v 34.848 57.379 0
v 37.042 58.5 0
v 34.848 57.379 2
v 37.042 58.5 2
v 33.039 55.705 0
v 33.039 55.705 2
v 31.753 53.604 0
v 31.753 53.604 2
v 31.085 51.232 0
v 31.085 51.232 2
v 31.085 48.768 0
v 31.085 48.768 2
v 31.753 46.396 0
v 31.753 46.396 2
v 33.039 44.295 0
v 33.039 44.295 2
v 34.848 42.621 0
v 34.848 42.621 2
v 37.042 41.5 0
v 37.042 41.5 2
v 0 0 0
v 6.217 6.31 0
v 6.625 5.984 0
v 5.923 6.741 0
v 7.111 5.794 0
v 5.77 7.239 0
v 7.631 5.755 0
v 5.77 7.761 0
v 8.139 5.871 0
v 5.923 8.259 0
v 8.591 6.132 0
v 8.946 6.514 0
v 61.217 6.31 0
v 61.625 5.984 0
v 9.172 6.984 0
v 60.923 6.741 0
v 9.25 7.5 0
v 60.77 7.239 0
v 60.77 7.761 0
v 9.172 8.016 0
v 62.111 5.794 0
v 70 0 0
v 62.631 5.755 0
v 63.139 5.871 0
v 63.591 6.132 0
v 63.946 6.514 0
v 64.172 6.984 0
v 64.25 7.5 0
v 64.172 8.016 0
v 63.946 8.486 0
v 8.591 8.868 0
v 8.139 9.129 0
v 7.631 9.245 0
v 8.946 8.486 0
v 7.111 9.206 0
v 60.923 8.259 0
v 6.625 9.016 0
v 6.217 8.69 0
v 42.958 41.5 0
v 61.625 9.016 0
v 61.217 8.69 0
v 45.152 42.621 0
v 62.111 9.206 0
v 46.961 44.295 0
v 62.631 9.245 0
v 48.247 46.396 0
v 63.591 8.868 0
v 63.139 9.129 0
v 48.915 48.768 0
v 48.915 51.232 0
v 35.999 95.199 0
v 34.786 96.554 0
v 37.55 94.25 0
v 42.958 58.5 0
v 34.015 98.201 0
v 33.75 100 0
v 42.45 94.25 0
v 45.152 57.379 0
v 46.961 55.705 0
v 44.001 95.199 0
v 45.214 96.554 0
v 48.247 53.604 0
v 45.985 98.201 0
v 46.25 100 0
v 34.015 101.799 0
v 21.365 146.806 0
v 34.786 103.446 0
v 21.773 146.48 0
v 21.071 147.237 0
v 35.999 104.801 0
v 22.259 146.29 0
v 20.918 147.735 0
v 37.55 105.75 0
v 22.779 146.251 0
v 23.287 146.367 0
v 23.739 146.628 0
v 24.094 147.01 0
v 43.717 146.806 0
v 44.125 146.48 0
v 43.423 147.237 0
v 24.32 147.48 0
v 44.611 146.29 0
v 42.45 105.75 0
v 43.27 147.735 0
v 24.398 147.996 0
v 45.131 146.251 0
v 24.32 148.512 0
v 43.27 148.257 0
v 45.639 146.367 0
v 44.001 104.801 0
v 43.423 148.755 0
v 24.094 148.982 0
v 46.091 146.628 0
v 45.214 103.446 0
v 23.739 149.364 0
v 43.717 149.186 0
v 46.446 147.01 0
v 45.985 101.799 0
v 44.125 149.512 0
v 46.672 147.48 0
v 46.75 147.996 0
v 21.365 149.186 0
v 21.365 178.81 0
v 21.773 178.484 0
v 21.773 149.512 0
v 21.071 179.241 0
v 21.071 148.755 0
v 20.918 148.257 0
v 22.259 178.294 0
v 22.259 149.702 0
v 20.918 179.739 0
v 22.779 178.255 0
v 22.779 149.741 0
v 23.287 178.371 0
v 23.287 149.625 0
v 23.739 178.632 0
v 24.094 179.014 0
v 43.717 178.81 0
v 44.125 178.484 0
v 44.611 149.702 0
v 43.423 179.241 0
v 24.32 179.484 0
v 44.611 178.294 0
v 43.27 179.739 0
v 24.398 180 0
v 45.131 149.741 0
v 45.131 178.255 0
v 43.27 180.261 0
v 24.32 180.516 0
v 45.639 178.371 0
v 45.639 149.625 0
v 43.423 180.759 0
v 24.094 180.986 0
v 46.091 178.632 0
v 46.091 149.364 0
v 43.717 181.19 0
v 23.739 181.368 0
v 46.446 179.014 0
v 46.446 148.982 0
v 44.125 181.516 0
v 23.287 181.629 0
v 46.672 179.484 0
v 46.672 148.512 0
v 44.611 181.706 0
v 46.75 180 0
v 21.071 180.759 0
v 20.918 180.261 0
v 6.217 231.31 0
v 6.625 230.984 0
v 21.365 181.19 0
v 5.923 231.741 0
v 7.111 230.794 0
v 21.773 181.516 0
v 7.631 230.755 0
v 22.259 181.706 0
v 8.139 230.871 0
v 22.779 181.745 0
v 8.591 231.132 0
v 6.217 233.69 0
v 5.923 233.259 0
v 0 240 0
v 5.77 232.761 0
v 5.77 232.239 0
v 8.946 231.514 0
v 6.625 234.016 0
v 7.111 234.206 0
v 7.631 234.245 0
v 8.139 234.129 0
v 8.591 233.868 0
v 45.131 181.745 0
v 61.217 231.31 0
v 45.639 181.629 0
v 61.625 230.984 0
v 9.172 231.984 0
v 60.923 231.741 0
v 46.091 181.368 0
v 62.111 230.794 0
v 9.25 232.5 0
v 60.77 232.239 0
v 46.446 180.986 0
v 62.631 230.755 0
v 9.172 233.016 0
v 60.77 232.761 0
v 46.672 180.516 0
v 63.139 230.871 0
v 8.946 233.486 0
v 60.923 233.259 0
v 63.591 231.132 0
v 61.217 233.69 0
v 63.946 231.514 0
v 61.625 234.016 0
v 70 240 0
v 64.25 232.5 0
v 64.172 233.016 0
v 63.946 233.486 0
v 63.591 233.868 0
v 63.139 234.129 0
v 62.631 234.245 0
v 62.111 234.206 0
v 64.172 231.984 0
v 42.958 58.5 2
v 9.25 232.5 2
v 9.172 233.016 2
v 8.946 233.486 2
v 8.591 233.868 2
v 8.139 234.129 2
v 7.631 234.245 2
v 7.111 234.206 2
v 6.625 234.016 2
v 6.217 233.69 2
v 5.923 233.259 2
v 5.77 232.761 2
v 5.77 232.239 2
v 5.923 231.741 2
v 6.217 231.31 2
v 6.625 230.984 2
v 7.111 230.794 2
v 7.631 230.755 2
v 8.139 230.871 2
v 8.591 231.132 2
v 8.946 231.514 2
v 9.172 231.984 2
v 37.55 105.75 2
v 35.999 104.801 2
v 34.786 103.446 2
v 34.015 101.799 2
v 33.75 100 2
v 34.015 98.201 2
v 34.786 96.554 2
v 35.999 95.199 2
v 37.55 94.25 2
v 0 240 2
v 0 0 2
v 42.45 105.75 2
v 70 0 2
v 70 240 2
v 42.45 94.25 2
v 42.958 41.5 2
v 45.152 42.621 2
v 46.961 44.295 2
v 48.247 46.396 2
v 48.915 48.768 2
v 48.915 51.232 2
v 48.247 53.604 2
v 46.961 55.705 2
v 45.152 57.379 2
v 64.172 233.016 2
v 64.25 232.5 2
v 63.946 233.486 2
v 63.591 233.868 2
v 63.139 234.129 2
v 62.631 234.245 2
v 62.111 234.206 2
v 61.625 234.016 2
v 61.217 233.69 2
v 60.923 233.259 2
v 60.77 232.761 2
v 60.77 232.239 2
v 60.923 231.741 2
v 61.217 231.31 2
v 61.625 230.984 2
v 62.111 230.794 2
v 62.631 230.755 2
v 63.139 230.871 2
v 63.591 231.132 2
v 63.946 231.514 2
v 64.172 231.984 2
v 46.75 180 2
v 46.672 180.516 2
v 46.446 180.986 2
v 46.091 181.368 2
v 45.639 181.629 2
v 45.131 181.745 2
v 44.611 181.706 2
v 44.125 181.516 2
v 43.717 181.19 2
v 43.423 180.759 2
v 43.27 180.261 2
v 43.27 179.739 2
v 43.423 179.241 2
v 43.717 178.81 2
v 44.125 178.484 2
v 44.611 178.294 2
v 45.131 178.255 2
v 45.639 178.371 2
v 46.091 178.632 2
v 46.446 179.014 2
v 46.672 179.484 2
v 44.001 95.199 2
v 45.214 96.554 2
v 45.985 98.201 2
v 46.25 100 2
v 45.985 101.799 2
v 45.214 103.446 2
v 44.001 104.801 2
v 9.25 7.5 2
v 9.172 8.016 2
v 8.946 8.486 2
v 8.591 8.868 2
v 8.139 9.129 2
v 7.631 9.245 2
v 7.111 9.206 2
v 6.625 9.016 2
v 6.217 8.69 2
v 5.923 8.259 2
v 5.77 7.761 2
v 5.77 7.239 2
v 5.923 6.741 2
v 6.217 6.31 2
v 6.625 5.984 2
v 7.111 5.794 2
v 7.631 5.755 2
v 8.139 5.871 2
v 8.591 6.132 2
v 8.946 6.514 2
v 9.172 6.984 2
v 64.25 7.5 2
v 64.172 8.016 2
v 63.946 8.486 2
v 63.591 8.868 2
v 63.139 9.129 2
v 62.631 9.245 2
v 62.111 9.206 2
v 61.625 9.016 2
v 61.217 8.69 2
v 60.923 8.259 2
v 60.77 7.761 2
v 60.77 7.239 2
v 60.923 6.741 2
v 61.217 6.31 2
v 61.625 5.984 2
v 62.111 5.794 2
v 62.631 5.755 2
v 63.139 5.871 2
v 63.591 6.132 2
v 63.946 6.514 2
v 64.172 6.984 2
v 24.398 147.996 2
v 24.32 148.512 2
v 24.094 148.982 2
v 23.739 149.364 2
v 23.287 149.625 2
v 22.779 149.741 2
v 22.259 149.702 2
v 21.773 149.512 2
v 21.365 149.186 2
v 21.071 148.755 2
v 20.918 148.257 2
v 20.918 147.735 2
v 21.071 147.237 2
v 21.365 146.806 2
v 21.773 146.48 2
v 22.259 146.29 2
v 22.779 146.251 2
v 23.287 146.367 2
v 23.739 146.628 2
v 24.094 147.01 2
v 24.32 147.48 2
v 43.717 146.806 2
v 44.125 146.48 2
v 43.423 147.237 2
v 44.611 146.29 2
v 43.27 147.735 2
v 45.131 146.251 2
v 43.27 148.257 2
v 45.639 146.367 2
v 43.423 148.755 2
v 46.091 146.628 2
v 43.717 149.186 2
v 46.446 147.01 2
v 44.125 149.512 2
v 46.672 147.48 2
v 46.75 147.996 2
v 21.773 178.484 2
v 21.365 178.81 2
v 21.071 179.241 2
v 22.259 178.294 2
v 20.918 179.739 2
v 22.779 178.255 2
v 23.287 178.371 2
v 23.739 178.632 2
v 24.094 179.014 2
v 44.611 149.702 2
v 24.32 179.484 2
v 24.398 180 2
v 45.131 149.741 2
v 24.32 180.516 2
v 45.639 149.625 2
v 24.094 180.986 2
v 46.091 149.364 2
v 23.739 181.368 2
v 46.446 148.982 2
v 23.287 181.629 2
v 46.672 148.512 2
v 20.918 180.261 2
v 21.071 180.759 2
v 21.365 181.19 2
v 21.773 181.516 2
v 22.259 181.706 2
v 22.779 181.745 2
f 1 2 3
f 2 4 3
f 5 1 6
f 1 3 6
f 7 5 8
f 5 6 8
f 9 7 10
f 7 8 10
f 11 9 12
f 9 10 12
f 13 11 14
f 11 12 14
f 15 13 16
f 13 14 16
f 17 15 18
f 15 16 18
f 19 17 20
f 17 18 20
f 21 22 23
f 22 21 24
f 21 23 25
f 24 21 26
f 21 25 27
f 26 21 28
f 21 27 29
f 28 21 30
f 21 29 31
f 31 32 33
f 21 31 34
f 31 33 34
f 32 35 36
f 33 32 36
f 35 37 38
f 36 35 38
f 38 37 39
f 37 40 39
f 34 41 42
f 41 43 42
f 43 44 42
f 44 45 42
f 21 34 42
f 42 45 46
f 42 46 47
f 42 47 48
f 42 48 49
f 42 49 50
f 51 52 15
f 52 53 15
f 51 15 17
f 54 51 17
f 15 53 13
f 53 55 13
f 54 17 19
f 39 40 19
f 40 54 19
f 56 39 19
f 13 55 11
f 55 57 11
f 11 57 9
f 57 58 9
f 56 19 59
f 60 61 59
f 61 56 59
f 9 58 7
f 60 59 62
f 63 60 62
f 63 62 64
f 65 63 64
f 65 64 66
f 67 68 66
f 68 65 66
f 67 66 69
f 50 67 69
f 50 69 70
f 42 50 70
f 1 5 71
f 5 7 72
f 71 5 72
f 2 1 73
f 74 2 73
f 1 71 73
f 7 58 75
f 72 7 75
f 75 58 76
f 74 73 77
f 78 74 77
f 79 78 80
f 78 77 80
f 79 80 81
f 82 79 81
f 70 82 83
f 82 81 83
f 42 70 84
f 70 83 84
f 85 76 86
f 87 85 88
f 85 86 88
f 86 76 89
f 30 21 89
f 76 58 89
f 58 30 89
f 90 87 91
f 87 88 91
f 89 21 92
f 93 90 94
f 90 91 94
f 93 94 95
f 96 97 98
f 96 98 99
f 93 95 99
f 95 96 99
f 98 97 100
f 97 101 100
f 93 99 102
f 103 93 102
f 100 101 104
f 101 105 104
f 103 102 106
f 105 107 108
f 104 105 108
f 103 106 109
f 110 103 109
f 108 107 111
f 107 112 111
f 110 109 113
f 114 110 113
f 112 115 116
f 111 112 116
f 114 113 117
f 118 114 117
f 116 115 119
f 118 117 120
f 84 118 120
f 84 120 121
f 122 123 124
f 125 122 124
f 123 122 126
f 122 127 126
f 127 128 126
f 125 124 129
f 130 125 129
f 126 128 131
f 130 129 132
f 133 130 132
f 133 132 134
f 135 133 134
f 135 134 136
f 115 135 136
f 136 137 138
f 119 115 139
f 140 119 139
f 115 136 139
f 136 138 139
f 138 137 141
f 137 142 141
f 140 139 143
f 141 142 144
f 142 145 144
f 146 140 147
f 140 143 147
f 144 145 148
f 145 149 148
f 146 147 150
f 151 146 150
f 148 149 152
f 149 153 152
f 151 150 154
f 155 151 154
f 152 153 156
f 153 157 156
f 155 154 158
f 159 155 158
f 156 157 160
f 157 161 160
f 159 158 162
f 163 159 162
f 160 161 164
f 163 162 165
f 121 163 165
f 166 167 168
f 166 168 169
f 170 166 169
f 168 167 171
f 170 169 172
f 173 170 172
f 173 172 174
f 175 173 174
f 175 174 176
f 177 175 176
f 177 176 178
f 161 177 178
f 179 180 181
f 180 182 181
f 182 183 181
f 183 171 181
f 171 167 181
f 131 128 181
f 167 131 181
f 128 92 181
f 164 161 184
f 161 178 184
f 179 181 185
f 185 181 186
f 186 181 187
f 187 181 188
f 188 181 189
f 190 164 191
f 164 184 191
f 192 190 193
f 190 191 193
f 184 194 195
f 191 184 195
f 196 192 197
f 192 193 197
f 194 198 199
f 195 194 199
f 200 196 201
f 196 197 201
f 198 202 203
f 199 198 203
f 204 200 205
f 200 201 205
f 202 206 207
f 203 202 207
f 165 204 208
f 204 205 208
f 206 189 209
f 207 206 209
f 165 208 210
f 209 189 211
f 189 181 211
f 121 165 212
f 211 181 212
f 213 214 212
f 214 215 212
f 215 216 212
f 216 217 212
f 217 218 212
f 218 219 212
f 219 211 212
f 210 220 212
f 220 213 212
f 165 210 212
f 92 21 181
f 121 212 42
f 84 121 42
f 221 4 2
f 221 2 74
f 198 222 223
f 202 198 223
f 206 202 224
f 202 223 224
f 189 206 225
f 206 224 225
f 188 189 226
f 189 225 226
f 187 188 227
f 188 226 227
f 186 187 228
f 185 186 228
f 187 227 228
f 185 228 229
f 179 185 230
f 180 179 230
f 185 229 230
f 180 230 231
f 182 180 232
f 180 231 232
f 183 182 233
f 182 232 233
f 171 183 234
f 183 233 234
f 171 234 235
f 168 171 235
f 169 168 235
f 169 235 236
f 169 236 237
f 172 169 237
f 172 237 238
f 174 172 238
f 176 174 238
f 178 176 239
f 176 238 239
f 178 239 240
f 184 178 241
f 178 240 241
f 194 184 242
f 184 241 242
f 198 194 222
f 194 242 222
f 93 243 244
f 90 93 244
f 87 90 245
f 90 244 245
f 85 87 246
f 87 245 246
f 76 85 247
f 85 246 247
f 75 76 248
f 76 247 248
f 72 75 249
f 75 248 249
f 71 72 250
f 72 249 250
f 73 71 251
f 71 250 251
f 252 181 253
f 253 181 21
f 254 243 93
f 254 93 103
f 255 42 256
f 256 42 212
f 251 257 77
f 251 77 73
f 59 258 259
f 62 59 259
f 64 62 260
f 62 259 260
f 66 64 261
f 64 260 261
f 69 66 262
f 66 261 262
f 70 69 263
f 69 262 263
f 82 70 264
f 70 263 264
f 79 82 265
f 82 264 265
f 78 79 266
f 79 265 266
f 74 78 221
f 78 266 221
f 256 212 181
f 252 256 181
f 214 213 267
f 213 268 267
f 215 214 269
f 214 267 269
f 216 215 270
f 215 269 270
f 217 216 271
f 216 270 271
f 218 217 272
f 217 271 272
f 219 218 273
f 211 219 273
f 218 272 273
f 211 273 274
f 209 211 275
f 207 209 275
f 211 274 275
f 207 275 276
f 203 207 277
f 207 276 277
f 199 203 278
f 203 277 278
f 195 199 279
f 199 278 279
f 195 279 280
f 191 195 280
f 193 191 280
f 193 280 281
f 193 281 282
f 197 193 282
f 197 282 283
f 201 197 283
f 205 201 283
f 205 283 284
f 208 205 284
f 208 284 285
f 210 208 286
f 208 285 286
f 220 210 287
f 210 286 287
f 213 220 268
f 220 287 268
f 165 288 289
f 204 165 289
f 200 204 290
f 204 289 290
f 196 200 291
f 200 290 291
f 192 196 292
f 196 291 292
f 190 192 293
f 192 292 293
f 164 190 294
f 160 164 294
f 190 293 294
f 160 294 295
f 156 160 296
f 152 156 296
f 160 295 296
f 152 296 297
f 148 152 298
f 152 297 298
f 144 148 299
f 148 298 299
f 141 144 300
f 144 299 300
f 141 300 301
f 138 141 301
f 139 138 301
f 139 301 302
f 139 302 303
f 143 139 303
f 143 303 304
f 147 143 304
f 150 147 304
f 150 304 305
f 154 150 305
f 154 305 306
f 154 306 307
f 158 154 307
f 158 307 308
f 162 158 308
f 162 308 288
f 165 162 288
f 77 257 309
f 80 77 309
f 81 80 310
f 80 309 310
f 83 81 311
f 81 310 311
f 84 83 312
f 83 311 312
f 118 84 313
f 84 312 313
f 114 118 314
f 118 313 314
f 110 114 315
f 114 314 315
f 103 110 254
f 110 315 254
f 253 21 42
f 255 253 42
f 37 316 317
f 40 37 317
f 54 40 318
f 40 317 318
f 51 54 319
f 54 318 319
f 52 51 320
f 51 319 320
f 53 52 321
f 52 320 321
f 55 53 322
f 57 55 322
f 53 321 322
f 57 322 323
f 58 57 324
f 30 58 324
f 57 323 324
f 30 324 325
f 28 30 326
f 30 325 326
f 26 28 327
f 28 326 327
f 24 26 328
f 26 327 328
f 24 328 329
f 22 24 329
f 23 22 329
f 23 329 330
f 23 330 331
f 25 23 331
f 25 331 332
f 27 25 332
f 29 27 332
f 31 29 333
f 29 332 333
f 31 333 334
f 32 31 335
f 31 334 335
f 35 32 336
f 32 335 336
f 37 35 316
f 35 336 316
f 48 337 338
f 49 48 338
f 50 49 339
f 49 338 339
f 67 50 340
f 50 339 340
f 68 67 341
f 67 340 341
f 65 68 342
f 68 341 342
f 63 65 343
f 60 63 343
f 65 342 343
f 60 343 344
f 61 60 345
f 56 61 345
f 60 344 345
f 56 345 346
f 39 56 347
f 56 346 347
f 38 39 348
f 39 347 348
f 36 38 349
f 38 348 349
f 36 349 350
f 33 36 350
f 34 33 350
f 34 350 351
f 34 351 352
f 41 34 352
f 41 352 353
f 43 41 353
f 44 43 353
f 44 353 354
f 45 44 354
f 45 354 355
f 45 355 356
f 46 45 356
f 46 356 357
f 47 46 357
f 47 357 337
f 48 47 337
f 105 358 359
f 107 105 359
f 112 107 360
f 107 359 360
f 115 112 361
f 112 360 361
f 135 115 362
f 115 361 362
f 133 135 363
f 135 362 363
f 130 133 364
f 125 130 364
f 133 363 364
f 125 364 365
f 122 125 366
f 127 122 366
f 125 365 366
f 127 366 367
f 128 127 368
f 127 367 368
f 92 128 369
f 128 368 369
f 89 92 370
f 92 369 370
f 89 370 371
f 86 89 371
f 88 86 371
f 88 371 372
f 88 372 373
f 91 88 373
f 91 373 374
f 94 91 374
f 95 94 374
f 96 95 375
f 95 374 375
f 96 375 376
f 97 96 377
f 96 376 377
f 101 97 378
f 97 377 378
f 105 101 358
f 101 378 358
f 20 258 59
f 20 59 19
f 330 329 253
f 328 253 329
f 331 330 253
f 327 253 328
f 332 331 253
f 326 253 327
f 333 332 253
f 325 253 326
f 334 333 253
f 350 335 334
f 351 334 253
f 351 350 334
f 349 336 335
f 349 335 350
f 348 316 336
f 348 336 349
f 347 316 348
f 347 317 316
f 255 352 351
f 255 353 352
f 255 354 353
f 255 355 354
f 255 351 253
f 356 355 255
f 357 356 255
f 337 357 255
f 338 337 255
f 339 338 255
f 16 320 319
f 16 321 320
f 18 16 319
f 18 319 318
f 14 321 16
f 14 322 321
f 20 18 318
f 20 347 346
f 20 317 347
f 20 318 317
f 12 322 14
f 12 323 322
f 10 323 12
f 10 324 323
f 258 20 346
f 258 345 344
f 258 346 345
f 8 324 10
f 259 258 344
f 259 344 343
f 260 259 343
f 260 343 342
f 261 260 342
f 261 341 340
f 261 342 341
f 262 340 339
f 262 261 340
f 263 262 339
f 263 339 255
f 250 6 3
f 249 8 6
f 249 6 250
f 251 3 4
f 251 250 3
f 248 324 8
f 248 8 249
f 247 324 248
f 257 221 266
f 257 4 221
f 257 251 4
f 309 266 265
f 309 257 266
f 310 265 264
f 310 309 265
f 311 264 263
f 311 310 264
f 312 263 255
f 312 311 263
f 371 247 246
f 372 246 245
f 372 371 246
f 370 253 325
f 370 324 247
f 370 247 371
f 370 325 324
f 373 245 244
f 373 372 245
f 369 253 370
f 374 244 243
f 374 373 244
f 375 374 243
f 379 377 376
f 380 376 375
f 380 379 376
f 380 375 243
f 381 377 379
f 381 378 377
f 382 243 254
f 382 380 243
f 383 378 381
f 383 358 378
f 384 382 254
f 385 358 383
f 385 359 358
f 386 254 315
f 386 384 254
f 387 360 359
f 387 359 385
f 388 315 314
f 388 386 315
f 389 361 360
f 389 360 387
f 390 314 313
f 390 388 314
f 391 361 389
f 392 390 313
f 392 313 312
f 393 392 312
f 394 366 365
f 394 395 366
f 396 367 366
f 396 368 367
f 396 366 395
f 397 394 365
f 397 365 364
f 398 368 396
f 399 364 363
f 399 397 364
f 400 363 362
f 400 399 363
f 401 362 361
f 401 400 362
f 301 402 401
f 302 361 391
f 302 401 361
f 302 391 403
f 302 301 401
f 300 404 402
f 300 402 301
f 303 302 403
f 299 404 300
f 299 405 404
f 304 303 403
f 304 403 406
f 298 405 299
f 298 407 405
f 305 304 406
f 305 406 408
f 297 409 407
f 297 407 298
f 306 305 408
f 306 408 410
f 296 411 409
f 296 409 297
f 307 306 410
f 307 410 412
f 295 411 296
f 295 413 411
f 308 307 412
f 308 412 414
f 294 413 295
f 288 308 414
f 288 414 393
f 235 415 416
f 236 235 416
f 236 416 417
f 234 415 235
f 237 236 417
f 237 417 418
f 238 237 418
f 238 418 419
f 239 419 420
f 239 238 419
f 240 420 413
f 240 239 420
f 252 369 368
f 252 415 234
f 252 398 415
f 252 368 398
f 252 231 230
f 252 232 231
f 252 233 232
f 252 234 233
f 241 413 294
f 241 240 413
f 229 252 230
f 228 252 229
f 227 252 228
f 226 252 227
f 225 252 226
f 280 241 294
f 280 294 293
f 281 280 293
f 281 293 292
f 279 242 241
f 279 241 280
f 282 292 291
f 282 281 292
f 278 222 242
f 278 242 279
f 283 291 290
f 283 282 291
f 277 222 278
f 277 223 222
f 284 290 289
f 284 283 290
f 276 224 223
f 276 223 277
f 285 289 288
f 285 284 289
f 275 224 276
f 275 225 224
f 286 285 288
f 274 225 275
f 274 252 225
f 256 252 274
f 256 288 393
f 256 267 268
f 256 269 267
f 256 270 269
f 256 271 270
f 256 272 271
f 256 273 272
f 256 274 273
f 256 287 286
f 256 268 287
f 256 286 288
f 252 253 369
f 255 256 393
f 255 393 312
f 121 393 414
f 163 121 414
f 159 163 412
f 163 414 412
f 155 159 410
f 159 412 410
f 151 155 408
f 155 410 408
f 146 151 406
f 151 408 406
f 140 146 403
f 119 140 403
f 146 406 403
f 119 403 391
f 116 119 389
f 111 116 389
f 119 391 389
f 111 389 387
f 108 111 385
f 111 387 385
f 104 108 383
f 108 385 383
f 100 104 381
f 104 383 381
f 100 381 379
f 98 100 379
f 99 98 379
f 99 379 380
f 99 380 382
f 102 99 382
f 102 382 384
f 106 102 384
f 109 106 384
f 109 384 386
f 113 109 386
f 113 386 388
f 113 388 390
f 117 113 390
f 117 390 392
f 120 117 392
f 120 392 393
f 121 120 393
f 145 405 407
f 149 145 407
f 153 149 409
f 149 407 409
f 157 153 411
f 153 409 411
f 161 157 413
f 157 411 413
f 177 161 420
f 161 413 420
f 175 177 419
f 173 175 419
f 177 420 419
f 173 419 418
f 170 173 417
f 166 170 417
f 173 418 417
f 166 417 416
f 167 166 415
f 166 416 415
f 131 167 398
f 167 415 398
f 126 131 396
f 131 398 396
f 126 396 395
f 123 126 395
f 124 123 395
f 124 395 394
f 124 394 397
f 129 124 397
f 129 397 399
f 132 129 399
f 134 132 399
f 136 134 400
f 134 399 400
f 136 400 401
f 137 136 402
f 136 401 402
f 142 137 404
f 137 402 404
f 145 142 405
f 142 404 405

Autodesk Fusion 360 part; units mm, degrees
sketch "Sketch1" plane through (0, 0, 0) normal (0, 0, 1) x (1, 0, 0)
  line L0 (0, 0) -> (70, 0)
  line L1 (70, 0) -> (70, 240)
  line L2 (70, 240) -> (0, 240)
  line L3 (0, 240) -> (0, 0)
  dimension "d1" = 240
  dimension "d2" = 70
extrude "Extrude1" add sketch "Sketch1" along normal blind 2
sketch "Sketch2" plane through (0, 0, 2) normal (0, 0, 1) x (1, 0, 0)
  line L0 (0, 240) -> (0, 0)
  line L1 (0, 0) -> (70, 0)
  line L2 (70, 0) -> (70, 240)
  line L3 (70, 240) -> (0, 240)
  circle A0 centre (40, 50) radius 9
  line L4 (42.958, 41.5) -> (37.042, 41.5)
  line L5 (37.042, 41.5) -> (37.042, 58.5)
  line L6 (37.042, 58.5) -> (42.958, 58.5)
  line L7 (42.958, 58.5) -> (42.958, 41.5)
  circle A1 centre (40, 100) radius 6.25
  line L8 (42.4495, 94.25) -> (37.5505, 94.25)
  line L9 (37.5505, 94.25) -> (37.5505, 105.75)
  line L10 (37.5505, 105.75) -> (42.4495, 105.75)
  line L11 (42.4495, 105.75) -> (42.4495, 94.25)
  point P0 (35, 0)
  point P1 (40, 41.5)
  dimension "d5" = 18
  dimension "d6" = 17
  dimension "d7" = 50
  dimension "d8" = 12.5
  dimension "d9" = 11.5
  dimension "d10" = 50
  dimension "d14" = 40
extrude "Extrude2" cut sketch "Sketch2" against normal blind 15 contours A0 L7 | L4 L5 L6 L7 | A0 L5 | A1 L11 | L8 L9 L10 L11 | A1 L9
sketch "Sketch3" plane through (0, 0, 2) normal (0, 0, 1) x (1, 0, 0)
  line L0 (42.958, 41.5) -> (37.042, 41.5)
  arc A0 (37.042, 58.5) -> (37.042, 41.5) centre (40, 50) ccw
  line L1 (37.042, 58.5) -> (42.958, 58.5)
  arc A1 (42.958, 41.5) -> (42.958, 58.5) centre (40, 50) ccw
  line L2 (42.4495, 94.25) -> (37.5505, 94.25)
  arc A2 (37.5505, 105.75) -> (37.5505, 94.25) centre (40, 100) ccw
  line L3 (37.5505, 105.75) -> (42.4495, 105.75)
  arc A3 (42.4495, 94.25) -> (42.4495, 105.75) centre (40, 100) ccw
  line L4 (0, 240) -> (0, 0)
  line L5 (0, 0) -> (70, 0)
  line L6 (70, 0) -> (70, 240)
  line L7 (70, 240) -> (0, 240)
  circle A4 centre (7.5, 232.5) radius 1.75
  circle A5 centre (62.5, 232.5) radius 1.75
  circle A6 centre (62.5, 7.5) radius 1.75
  circle A7 centre (7.5, 7.5) radius 1.75
  line L8 (7.5, 232.5) -> (7.5, 7.5) construction
  line L9 (7.5, 7.5) -> (62.5, 7.5) construction
  line L10 (62.5, 7.5) -> (62.5, 232.5) construction
  line L11 (62.5, 232.5) -> (7.5, 232.5) construction
  dimension "d15" = 7.5
  dimension "d16" = 3.5
  dimension "d17" = 3.5
  dimension "d18" = 3.5
  dimension "d19" = 3.5
extrude "Extrude3" cut sketch "Sketch3" against normal blind 5 contours A4 | A5 | A6 | A7
sketch "Sketch4" plane through (0, 0, 2) normal (0, 0, 1) x (1, 0, 0)
  circle A0 centre (62.5, 232.5) radius 1.75
  circle A1 centre (7.5, 7.5) radius 1.75
  circle A2 centre (7.5, 232.5) radius 1.75
  circle A3 centre (62.5, 7.5) radius 1.75
  line L0 (42.958, 41.5) -> (37.042, 41.5)
  arc A4 (37.042, 58.5) -> (37.042, 41.5) centre (40, 50) ccw
  line L1 (37.042, 58.5) -> (42.958, 58.5)
  arc A5 (42.958, 41.5) -> (42.958, 58.5) centre (40, 50) ccw
  line L2 (42.4495, 94.25) -> (37.5505, 94.25)
  arc A6 (37.5505, 105.75) -> (37.5505, 94.25) centre (40, 100) ccw
  line L3 (37.5505, 105.75) -> (42.4495, 105.75)
  arc A7 (42.4495, 94.25) -> (42.4495, 105.75) centre (40, 100) ccw
  line L4 (0, 240) -> (0, 0)
  line L5 (0, 0) -> (70, 0)
  line L6 (70, 0) -> (70, 240)
  line L7 (70, 240) -> (0, 240)
  circle A8 centre (22.648, 147.996) radius 1.75
  circle A9 centre (22.648, 180) radius 1.75
  circle A10 centre (45, 147.996) radius 1.75
  circle A11 centre (45, 180) radius 1.75
  dimension "d22" = 3.5
  dimension "d23" = 3.5
  dimension "d24" = 32.004
  dimension "d25" = 3.5
  dimension "d26" = 3.5
  dimension "d27" = 22.352
  dimension "d28" = 25
  dimension "d29" = 60
extrude "Extrude4" cut sketch "Sketch4" against normal blind 5 contours A8 | A9 | A10 | A11
equation "d1 = 210 mm + 30 mm"
equation "d17 = d16"
equation "d18 = d16"
equation "d19 = d16"
equation "d23 = d22"
equation "d25 = d22"
equation "d26 = d23"
equation "d27 = 1 in - 0.12 in"
